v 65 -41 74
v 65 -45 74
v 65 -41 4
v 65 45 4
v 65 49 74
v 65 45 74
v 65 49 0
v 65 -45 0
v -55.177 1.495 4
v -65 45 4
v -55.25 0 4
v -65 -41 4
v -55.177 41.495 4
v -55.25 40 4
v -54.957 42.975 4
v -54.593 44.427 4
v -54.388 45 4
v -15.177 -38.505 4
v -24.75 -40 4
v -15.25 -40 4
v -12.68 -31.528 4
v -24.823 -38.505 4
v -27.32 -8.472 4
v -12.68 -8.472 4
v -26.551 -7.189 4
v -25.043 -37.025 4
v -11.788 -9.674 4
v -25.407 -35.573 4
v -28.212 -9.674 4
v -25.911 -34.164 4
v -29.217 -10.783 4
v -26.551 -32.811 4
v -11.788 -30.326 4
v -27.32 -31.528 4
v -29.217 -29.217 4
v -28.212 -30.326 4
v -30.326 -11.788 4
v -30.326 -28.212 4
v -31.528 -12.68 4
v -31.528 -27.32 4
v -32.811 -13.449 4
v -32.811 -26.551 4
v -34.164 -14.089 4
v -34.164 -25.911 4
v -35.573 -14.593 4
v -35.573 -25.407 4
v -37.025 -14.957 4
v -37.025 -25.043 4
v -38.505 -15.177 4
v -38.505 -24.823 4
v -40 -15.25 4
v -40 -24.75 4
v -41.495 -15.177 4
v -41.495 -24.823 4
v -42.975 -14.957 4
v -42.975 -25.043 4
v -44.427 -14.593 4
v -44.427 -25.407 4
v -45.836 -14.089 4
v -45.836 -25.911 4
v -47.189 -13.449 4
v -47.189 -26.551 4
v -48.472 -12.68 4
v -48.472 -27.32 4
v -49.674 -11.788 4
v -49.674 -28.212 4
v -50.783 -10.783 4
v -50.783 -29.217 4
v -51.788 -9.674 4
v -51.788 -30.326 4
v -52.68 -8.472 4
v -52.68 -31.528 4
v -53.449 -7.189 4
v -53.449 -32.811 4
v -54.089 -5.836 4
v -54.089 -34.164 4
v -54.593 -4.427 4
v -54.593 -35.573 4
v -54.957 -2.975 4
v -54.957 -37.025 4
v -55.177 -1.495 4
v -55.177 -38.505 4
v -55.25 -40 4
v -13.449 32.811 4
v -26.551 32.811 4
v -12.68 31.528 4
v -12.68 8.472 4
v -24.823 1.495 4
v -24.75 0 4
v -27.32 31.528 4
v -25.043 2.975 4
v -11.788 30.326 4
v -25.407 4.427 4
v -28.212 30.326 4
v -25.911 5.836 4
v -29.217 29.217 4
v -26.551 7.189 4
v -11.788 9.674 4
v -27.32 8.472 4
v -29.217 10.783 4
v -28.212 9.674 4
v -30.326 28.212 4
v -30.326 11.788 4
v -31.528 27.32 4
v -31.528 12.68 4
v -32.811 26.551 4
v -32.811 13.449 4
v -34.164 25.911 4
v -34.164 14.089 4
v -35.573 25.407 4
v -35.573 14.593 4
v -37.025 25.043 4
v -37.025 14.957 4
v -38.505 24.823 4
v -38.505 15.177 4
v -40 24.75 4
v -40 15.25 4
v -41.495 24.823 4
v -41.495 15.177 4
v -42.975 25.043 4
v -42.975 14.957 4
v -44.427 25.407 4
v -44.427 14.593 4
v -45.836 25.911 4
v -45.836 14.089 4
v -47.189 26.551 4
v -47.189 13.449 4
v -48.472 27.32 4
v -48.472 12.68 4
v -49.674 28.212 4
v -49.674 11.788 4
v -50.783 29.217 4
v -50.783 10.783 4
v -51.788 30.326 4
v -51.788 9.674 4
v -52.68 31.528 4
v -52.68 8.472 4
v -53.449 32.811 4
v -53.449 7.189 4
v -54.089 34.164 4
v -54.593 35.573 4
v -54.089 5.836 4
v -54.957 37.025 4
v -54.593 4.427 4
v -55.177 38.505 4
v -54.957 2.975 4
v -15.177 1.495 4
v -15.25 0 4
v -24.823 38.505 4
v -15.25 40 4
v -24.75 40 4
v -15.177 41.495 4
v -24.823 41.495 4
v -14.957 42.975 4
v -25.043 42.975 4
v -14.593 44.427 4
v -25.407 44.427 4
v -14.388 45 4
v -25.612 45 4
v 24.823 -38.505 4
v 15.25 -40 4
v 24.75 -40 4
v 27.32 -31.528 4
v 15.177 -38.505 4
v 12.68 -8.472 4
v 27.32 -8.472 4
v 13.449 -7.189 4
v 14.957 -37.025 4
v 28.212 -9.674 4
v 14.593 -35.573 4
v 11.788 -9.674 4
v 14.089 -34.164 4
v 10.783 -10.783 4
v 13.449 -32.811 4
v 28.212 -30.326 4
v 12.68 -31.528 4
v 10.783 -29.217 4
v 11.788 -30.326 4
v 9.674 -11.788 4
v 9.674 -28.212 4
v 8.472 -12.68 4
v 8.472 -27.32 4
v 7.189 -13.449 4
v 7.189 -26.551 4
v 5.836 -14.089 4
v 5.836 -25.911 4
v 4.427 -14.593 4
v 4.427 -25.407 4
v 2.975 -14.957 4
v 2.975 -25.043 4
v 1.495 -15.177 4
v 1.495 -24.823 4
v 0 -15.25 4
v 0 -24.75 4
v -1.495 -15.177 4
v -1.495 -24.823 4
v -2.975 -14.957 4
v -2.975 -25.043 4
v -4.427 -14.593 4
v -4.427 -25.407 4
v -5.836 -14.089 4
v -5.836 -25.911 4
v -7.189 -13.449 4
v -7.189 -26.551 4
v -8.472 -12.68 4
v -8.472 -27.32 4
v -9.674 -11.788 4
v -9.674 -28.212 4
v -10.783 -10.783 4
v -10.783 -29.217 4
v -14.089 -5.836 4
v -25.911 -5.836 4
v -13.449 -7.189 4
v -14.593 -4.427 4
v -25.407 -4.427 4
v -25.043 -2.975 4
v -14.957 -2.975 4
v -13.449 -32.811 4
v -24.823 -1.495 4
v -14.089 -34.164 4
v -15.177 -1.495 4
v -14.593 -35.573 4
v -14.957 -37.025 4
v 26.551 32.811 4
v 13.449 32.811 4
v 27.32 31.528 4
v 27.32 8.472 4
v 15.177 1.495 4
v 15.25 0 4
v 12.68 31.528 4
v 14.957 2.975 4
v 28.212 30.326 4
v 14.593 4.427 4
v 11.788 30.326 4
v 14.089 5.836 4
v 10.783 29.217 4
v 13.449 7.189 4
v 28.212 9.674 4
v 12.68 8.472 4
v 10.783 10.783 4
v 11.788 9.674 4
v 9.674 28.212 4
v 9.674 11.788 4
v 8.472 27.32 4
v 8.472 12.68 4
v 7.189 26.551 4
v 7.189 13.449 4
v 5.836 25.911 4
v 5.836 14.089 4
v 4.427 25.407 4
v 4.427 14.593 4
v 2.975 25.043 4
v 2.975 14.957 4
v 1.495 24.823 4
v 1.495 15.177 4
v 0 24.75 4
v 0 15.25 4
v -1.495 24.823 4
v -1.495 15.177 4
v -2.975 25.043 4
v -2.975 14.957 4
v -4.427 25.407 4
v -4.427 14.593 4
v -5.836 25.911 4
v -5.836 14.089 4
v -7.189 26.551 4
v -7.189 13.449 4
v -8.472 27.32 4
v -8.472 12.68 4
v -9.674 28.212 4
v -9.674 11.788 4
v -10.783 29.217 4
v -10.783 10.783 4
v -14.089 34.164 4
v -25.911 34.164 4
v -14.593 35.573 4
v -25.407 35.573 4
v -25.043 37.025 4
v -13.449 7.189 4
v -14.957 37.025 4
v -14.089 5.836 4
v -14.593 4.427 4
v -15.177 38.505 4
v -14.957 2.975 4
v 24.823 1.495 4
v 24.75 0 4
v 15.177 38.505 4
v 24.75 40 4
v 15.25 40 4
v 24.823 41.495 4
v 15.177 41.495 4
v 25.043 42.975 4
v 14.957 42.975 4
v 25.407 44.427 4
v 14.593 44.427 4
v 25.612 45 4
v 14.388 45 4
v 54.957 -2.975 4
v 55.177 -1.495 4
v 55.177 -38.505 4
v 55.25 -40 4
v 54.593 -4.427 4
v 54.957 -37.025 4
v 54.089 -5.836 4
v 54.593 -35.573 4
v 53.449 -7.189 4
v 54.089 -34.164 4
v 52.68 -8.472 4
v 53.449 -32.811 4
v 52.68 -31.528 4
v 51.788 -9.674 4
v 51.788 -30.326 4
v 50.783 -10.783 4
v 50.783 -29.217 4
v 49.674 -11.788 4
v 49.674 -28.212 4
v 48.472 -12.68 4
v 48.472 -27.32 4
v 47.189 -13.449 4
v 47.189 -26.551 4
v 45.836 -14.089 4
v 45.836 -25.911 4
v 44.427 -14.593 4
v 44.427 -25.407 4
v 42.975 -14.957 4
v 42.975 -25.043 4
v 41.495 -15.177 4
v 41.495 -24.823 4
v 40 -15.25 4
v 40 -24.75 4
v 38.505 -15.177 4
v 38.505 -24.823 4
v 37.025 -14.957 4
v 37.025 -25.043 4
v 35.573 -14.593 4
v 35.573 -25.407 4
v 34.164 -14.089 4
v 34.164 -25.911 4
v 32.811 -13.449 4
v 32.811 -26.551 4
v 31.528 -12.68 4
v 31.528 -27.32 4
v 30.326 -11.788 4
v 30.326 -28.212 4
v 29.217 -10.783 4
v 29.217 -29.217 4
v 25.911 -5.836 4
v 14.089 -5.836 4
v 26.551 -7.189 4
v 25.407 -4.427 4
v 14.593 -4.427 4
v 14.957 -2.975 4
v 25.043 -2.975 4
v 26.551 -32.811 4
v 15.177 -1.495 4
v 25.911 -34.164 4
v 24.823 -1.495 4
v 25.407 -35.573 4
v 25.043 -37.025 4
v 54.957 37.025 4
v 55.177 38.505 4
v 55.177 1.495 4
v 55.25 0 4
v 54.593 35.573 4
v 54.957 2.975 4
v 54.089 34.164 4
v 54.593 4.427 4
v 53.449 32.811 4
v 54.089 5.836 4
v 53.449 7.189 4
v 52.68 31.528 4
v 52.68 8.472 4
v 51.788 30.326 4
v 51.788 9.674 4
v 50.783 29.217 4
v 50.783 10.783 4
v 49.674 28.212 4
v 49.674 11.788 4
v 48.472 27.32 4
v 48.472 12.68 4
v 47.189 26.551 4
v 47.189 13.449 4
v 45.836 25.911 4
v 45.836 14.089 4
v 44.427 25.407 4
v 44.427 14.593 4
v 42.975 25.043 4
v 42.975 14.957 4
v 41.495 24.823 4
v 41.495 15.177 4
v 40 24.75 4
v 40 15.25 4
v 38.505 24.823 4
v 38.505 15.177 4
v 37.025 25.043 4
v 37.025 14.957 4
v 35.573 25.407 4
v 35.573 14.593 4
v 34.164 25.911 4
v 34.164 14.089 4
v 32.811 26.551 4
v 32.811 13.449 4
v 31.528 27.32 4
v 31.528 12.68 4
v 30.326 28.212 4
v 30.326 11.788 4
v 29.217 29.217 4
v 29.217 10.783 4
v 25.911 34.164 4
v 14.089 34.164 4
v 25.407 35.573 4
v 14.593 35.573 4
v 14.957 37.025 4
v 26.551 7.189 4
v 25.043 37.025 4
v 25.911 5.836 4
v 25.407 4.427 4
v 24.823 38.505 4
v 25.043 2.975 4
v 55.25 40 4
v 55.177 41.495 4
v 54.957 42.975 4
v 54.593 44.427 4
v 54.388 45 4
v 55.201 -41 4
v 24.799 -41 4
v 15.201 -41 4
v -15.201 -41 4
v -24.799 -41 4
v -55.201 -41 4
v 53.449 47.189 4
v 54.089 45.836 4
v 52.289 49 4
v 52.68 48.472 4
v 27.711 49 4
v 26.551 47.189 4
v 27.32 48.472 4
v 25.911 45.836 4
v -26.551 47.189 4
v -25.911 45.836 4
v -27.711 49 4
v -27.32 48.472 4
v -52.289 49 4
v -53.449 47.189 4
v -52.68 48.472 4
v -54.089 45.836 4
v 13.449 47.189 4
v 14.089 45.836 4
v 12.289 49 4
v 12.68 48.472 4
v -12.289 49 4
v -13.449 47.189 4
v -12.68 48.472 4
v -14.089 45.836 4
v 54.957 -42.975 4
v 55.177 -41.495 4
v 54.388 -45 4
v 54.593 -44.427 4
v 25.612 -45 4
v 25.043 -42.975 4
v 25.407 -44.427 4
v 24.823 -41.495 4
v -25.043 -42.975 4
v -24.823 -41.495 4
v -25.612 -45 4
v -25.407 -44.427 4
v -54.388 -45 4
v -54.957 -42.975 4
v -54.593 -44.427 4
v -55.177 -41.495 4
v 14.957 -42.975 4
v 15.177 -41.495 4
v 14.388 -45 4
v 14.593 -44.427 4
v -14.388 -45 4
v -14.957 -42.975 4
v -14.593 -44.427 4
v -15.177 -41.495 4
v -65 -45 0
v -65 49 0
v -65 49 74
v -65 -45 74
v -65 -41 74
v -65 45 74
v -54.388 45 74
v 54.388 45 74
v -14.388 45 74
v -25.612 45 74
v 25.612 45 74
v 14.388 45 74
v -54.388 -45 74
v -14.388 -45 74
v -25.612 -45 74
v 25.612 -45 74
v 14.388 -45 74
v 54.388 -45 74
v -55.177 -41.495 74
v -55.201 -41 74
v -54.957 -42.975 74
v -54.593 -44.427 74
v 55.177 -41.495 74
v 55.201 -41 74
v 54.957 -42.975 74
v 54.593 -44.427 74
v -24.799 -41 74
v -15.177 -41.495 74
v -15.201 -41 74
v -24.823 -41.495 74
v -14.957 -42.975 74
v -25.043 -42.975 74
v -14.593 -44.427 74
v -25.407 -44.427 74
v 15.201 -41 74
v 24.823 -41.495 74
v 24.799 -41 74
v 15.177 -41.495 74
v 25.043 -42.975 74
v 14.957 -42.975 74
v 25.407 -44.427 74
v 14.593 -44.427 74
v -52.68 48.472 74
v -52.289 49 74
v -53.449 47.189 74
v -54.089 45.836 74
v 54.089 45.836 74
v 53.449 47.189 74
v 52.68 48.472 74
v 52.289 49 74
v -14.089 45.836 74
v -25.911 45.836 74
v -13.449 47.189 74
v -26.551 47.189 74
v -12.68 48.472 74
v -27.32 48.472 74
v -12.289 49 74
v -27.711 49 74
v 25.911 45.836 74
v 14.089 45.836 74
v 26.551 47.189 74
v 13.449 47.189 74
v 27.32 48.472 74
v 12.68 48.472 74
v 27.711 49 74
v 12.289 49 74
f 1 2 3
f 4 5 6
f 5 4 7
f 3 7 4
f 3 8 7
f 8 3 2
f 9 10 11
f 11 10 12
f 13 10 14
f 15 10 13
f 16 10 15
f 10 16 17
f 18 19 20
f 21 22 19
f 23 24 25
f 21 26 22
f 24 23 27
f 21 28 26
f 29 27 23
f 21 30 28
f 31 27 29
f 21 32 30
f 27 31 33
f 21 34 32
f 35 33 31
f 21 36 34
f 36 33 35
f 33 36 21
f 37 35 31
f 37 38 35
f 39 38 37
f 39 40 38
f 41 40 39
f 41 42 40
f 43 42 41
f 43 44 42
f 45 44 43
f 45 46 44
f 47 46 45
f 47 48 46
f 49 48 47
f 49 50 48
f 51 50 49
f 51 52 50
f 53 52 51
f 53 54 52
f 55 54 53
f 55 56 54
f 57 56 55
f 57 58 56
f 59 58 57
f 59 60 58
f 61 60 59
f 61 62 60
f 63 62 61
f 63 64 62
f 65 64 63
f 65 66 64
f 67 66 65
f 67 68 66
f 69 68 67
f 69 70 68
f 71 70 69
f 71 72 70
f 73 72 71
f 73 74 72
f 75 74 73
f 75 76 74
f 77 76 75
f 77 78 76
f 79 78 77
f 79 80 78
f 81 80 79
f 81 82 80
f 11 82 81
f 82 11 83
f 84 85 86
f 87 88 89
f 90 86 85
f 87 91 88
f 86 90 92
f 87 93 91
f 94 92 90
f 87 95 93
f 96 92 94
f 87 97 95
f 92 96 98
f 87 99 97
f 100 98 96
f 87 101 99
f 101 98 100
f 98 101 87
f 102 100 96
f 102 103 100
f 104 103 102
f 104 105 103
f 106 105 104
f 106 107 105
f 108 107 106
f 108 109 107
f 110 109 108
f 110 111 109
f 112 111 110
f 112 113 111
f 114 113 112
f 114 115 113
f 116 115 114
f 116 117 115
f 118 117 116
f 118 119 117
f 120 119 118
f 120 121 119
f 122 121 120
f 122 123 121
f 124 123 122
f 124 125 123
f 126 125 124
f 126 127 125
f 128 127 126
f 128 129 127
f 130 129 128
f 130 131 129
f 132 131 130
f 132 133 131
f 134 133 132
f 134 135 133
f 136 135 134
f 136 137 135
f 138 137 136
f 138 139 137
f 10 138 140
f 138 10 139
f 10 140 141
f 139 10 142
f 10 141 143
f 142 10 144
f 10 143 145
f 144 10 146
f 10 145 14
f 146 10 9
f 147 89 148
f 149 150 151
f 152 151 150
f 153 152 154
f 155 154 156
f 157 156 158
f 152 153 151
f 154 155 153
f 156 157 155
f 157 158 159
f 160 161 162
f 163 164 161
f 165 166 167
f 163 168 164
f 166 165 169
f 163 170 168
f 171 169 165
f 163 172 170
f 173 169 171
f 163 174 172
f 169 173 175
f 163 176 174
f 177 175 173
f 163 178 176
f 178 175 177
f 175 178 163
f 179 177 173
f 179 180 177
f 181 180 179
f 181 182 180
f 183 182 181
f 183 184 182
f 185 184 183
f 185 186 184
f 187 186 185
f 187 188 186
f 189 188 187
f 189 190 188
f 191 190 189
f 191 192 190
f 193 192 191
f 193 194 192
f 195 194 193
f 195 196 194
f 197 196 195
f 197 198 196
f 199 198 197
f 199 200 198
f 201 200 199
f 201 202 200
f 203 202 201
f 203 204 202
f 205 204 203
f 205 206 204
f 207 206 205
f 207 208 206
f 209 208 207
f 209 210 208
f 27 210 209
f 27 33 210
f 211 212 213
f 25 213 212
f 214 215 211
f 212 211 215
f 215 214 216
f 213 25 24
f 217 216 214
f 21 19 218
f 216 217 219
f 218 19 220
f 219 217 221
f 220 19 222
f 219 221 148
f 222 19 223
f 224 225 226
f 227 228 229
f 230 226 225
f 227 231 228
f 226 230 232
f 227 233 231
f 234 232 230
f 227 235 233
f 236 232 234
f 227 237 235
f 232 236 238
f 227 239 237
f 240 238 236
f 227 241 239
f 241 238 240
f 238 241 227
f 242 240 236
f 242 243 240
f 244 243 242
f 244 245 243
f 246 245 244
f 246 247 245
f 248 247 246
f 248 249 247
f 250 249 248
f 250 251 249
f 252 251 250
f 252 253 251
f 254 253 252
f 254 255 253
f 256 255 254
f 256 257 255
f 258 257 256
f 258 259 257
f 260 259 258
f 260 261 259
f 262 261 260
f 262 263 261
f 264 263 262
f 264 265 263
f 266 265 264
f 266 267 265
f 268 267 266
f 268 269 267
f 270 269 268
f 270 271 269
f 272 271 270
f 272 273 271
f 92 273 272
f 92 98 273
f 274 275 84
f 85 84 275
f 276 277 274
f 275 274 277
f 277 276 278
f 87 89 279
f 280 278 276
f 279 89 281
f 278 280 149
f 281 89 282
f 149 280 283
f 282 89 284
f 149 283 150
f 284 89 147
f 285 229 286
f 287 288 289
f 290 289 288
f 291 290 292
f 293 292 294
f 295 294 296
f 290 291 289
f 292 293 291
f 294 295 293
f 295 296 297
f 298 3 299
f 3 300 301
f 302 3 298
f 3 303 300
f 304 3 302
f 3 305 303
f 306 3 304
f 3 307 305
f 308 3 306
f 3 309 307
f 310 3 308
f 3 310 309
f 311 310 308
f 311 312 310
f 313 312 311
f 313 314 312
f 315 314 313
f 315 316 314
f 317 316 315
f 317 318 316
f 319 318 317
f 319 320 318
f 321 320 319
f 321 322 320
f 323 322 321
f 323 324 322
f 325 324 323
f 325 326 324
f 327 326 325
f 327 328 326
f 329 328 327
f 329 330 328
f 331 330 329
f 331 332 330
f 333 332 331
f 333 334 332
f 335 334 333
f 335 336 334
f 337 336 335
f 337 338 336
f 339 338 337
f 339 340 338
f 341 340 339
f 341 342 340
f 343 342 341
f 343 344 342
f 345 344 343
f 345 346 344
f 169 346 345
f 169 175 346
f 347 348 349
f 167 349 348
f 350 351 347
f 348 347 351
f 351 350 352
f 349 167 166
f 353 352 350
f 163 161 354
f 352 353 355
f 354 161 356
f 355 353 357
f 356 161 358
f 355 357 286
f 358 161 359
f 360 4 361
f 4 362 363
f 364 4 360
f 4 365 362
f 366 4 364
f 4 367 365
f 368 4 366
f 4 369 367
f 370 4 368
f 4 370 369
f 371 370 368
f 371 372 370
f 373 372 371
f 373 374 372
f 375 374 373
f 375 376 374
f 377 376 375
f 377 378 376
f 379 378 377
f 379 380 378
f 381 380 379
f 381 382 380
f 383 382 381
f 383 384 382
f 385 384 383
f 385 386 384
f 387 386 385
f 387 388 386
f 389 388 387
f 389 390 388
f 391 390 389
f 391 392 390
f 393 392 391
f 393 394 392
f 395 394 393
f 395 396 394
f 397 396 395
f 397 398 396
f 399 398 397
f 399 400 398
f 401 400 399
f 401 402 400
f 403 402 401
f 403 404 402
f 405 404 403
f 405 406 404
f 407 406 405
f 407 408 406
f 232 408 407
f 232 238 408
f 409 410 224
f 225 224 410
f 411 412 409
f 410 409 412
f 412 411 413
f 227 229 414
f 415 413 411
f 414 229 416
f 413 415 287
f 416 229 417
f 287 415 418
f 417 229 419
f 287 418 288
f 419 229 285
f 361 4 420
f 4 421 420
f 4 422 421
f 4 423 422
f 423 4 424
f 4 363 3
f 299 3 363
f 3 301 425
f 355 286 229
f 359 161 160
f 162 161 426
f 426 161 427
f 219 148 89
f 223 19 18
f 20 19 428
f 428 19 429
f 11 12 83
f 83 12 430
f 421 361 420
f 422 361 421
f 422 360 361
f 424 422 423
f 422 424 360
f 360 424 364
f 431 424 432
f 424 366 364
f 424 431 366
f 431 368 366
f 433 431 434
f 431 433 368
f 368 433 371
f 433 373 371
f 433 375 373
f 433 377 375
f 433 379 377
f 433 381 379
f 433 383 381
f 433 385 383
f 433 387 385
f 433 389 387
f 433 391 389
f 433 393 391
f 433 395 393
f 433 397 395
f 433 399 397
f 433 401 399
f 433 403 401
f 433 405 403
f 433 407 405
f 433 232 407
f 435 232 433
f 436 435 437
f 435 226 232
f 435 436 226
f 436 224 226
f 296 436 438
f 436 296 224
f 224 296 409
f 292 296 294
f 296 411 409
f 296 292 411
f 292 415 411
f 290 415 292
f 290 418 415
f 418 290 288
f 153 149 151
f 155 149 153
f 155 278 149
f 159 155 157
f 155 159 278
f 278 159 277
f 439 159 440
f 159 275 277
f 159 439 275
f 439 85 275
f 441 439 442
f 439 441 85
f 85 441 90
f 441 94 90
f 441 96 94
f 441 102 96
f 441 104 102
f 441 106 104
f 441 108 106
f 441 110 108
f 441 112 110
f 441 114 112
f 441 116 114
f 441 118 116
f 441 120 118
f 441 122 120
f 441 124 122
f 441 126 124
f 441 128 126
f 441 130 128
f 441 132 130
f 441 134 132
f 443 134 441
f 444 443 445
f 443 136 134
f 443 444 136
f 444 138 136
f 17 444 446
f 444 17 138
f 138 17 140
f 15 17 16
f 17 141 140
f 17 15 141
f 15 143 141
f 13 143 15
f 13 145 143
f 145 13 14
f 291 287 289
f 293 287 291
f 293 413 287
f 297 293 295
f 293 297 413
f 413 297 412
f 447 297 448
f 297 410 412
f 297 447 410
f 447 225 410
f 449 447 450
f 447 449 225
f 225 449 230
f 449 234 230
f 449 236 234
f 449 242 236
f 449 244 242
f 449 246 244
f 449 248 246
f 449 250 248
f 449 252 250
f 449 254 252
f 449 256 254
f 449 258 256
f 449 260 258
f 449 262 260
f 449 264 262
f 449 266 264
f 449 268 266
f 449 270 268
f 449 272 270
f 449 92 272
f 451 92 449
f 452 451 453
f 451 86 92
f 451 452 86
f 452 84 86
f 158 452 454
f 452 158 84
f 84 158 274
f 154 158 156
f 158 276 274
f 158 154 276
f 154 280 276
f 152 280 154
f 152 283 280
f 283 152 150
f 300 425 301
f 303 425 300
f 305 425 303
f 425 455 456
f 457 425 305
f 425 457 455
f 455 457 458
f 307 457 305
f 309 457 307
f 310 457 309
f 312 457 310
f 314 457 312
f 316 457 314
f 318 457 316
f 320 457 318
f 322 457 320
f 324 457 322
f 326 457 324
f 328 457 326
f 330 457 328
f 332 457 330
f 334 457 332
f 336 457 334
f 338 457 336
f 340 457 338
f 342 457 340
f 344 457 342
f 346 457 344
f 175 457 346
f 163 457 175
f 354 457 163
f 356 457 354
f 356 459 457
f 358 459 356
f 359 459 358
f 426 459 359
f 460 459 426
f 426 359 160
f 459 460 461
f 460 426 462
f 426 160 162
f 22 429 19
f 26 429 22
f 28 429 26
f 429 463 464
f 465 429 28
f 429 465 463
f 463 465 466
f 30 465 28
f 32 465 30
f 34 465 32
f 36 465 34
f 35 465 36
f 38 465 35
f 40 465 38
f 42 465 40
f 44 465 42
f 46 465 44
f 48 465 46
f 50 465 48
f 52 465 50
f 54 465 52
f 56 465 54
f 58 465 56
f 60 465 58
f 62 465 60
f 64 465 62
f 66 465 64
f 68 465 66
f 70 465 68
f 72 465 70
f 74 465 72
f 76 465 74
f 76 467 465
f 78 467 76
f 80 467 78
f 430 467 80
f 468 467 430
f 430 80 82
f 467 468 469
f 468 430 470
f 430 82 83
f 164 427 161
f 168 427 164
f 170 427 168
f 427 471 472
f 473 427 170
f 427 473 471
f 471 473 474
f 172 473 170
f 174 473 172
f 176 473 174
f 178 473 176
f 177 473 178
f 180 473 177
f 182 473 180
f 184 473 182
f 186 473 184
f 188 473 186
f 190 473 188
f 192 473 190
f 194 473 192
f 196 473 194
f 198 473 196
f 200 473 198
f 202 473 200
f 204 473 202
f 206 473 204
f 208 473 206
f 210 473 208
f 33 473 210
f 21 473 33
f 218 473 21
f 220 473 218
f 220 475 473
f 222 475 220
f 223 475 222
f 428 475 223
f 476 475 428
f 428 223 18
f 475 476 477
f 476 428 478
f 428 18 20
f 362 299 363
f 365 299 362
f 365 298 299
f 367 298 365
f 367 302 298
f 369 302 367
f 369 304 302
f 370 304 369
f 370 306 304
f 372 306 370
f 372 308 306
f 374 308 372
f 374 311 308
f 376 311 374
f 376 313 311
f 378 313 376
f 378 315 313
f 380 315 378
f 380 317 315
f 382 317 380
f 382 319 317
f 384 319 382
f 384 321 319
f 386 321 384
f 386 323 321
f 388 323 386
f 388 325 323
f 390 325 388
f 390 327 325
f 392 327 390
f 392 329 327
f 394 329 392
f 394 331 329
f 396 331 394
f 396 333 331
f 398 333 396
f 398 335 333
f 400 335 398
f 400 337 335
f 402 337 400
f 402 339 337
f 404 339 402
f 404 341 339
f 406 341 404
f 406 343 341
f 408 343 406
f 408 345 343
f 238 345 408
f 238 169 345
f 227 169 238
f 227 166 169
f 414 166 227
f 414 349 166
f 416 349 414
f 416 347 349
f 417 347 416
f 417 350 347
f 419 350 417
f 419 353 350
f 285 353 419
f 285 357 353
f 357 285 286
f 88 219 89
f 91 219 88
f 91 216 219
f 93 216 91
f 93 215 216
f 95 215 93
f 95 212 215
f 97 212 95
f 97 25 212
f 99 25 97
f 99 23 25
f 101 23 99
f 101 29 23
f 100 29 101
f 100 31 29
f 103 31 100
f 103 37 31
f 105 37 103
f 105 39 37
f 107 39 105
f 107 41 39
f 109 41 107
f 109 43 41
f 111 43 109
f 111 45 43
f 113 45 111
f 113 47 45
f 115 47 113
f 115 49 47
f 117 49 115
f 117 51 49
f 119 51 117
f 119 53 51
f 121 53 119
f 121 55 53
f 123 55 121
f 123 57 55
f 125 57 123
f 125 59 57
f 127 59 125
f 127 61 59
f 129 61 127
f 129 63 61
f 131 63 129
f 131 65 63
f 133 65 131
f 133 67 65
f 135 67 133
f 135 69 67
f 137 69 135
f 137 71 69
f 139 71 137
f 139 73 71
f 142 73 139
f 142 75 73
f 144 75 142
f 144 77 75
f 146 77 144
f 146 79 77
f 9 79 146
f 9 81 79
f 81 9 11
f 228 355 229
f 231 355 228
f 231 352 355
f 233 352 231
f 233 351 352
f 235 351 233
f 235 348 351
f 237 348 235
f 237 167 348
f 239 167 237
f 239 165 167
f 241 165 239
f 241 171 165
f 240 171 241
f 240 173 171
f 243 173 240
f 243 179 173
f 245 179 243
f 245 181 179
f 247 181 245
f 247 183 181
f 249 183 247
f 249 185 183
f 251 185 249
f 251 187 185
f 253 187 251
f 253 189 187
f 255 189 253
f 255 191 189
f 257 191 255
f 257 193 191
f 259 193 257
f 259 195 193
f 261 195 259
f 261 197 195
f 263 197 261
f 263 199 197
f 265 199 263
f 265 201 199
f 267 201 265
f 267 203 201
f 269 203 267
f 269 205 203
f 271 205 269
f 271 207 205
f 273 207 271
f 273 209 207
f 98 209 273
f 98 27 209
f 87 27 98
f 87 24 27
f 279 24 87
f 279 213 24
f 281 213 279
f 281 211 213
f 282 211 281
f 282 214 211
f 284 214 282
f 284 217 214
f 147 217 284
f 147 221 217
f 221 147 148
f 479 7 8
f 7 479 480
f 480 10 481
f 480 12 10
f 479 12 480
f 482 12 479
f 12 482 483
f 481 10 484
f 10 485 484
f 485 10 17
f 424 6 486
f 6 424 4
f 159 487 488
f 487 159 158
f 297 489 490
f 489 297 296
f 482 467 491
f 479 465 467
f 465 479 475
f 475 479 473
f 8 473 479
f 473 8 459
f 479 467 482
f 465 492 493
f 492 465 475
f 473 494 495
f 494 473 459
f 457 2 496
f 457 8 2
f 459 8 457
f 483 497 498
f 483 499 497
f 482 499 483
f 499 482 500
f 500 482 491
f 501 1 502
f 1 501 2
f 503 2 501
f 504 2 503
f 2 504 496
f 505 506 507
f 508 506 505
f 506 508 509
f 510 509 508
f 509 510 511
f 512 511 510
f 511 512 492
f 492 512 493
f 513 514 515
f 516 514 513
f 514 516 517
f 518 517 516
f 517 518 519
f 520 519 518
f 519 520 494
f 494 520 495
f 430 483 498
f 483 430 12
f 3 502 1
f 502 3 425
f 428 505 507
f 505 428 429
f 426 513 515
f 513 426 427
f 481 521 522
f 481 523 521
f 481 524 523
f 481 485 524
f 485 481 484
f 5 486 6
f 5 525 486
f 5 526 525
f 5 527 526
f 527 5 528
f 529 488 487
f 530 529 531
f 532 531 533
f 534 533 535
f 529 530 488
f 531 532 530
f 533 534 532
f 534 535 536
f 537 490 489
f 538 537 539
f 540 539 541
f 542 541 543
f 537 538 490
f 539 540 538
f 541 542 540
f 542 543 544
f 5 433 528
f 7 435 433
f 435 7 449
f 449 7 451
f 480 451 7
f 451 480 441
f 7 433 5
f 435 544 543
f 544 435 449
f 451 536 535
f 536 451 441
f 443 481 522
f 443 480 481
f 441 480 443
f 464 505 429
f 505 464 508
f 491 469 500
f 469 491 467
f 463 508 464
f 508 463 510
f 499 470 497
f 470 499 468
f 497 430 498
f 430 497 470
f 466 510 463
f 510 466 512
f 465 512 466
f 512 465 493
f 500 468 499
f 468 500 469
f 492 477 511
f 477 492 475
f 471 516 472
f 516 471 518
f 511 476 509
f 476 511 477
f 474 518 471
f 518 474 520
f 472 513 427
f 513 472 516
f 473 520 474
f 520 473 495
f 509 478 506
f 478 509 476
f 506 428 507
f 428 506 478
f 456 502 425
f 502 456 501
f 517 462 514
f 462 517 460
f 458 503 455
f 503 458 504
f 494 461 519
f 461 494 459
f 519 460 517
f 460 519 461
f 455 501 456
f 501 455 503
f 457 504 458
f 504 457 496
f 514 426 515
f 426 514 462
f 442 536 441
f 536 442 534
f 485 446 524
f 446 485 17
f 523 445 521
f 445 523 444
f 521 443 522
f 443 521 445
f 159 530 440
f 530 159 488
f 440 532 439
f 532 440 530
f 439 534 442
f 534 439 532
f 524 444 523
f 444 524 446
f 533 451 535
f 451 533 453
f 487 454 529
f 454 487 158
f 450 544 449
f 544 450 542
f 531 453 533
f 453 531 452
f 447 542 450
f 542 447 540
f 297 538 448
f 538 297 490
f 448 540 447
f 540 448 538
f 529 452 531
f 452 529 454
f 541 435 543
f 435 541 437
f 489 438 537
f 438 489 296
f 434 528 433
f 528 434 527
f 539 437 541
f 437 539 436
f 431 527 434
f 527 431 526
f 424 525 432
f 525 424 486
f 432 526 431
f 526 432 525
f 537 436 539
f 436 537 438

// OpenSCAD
// Rack for six 50 mL conical (Falcon-type) tubes.
// Print orientation: Flat plate on bed (z=0), walls rising to z=70.
// After printing, flip over so walls are on the bed and tubes hang down.

// Plate dimensions
L     = 130; // Length (X)
W     = 90;  // Width (Y)
t     = 4;   // Plate thickness (Z)

// Hole specifications
n_holes = 6;
hole_d  = 30.5; // Diameter

// Grid layout
row_spacing = 40; // Centre-to-centre Y
col_spacing = 40; // Centre-to-centre X

// Wall specifications
wall_h = 70; // Height of walls from plate top (z=4)
wall_t = 4;  // Thickness of walls (Y)

// Derived positions
// The plate is centred on the origin.
// X range: -65 to +65
// Y range: -45 to +45
// Plate top surface is at z = t.

$fn = 64;

// Define the main body (Plate + Walls)
module rack_body() {
    // 1. The flat plate, centred on origin
    translate([-L/2, -W/2, 0]) cube([L, W, t]);

    // 2. The two side walls
    // Left wall (at Y = -W/2)
    translate([-L/2, -W/2, 0]) cube([L, wall_t, wall_h + t]);
    // Right wall (at Y = +W/2)
    translate([-L/2, W/2, 0]) cube([L, wall_t, wall_h + t]);
}

// Define the holes
module holes() {
    // Calculate positions relative to the plate top (z=t)
    // We subtract t from the Z coordinate of the cutting cylinder so it starts at the plate surface
    // and goes down (negative Z) to cut through.
    
    // Y positions for 3 rows: -40, 0, 40 (centred on Y=0)
    y_pos = [-40, 0, 40];
    // X positions for 3 cols: -40, 0, 40 (centred on X=0)
    x_pos = [-40, 0, 40];

    for (y = y_pos) {
        for (x = x_pos) {
            // Cut a cylinder through the plate and walls
            // The cylinder must extend slightly past the plate thickness to ensure clean cut
            // and past the wall height.
            translate([x, y, t]) 
                cylinder(h = wall_h + t + 1, d = hole_d);
        }
    }
}

difference() {
    union() {
        rack_body();
    }
    holes();
}
